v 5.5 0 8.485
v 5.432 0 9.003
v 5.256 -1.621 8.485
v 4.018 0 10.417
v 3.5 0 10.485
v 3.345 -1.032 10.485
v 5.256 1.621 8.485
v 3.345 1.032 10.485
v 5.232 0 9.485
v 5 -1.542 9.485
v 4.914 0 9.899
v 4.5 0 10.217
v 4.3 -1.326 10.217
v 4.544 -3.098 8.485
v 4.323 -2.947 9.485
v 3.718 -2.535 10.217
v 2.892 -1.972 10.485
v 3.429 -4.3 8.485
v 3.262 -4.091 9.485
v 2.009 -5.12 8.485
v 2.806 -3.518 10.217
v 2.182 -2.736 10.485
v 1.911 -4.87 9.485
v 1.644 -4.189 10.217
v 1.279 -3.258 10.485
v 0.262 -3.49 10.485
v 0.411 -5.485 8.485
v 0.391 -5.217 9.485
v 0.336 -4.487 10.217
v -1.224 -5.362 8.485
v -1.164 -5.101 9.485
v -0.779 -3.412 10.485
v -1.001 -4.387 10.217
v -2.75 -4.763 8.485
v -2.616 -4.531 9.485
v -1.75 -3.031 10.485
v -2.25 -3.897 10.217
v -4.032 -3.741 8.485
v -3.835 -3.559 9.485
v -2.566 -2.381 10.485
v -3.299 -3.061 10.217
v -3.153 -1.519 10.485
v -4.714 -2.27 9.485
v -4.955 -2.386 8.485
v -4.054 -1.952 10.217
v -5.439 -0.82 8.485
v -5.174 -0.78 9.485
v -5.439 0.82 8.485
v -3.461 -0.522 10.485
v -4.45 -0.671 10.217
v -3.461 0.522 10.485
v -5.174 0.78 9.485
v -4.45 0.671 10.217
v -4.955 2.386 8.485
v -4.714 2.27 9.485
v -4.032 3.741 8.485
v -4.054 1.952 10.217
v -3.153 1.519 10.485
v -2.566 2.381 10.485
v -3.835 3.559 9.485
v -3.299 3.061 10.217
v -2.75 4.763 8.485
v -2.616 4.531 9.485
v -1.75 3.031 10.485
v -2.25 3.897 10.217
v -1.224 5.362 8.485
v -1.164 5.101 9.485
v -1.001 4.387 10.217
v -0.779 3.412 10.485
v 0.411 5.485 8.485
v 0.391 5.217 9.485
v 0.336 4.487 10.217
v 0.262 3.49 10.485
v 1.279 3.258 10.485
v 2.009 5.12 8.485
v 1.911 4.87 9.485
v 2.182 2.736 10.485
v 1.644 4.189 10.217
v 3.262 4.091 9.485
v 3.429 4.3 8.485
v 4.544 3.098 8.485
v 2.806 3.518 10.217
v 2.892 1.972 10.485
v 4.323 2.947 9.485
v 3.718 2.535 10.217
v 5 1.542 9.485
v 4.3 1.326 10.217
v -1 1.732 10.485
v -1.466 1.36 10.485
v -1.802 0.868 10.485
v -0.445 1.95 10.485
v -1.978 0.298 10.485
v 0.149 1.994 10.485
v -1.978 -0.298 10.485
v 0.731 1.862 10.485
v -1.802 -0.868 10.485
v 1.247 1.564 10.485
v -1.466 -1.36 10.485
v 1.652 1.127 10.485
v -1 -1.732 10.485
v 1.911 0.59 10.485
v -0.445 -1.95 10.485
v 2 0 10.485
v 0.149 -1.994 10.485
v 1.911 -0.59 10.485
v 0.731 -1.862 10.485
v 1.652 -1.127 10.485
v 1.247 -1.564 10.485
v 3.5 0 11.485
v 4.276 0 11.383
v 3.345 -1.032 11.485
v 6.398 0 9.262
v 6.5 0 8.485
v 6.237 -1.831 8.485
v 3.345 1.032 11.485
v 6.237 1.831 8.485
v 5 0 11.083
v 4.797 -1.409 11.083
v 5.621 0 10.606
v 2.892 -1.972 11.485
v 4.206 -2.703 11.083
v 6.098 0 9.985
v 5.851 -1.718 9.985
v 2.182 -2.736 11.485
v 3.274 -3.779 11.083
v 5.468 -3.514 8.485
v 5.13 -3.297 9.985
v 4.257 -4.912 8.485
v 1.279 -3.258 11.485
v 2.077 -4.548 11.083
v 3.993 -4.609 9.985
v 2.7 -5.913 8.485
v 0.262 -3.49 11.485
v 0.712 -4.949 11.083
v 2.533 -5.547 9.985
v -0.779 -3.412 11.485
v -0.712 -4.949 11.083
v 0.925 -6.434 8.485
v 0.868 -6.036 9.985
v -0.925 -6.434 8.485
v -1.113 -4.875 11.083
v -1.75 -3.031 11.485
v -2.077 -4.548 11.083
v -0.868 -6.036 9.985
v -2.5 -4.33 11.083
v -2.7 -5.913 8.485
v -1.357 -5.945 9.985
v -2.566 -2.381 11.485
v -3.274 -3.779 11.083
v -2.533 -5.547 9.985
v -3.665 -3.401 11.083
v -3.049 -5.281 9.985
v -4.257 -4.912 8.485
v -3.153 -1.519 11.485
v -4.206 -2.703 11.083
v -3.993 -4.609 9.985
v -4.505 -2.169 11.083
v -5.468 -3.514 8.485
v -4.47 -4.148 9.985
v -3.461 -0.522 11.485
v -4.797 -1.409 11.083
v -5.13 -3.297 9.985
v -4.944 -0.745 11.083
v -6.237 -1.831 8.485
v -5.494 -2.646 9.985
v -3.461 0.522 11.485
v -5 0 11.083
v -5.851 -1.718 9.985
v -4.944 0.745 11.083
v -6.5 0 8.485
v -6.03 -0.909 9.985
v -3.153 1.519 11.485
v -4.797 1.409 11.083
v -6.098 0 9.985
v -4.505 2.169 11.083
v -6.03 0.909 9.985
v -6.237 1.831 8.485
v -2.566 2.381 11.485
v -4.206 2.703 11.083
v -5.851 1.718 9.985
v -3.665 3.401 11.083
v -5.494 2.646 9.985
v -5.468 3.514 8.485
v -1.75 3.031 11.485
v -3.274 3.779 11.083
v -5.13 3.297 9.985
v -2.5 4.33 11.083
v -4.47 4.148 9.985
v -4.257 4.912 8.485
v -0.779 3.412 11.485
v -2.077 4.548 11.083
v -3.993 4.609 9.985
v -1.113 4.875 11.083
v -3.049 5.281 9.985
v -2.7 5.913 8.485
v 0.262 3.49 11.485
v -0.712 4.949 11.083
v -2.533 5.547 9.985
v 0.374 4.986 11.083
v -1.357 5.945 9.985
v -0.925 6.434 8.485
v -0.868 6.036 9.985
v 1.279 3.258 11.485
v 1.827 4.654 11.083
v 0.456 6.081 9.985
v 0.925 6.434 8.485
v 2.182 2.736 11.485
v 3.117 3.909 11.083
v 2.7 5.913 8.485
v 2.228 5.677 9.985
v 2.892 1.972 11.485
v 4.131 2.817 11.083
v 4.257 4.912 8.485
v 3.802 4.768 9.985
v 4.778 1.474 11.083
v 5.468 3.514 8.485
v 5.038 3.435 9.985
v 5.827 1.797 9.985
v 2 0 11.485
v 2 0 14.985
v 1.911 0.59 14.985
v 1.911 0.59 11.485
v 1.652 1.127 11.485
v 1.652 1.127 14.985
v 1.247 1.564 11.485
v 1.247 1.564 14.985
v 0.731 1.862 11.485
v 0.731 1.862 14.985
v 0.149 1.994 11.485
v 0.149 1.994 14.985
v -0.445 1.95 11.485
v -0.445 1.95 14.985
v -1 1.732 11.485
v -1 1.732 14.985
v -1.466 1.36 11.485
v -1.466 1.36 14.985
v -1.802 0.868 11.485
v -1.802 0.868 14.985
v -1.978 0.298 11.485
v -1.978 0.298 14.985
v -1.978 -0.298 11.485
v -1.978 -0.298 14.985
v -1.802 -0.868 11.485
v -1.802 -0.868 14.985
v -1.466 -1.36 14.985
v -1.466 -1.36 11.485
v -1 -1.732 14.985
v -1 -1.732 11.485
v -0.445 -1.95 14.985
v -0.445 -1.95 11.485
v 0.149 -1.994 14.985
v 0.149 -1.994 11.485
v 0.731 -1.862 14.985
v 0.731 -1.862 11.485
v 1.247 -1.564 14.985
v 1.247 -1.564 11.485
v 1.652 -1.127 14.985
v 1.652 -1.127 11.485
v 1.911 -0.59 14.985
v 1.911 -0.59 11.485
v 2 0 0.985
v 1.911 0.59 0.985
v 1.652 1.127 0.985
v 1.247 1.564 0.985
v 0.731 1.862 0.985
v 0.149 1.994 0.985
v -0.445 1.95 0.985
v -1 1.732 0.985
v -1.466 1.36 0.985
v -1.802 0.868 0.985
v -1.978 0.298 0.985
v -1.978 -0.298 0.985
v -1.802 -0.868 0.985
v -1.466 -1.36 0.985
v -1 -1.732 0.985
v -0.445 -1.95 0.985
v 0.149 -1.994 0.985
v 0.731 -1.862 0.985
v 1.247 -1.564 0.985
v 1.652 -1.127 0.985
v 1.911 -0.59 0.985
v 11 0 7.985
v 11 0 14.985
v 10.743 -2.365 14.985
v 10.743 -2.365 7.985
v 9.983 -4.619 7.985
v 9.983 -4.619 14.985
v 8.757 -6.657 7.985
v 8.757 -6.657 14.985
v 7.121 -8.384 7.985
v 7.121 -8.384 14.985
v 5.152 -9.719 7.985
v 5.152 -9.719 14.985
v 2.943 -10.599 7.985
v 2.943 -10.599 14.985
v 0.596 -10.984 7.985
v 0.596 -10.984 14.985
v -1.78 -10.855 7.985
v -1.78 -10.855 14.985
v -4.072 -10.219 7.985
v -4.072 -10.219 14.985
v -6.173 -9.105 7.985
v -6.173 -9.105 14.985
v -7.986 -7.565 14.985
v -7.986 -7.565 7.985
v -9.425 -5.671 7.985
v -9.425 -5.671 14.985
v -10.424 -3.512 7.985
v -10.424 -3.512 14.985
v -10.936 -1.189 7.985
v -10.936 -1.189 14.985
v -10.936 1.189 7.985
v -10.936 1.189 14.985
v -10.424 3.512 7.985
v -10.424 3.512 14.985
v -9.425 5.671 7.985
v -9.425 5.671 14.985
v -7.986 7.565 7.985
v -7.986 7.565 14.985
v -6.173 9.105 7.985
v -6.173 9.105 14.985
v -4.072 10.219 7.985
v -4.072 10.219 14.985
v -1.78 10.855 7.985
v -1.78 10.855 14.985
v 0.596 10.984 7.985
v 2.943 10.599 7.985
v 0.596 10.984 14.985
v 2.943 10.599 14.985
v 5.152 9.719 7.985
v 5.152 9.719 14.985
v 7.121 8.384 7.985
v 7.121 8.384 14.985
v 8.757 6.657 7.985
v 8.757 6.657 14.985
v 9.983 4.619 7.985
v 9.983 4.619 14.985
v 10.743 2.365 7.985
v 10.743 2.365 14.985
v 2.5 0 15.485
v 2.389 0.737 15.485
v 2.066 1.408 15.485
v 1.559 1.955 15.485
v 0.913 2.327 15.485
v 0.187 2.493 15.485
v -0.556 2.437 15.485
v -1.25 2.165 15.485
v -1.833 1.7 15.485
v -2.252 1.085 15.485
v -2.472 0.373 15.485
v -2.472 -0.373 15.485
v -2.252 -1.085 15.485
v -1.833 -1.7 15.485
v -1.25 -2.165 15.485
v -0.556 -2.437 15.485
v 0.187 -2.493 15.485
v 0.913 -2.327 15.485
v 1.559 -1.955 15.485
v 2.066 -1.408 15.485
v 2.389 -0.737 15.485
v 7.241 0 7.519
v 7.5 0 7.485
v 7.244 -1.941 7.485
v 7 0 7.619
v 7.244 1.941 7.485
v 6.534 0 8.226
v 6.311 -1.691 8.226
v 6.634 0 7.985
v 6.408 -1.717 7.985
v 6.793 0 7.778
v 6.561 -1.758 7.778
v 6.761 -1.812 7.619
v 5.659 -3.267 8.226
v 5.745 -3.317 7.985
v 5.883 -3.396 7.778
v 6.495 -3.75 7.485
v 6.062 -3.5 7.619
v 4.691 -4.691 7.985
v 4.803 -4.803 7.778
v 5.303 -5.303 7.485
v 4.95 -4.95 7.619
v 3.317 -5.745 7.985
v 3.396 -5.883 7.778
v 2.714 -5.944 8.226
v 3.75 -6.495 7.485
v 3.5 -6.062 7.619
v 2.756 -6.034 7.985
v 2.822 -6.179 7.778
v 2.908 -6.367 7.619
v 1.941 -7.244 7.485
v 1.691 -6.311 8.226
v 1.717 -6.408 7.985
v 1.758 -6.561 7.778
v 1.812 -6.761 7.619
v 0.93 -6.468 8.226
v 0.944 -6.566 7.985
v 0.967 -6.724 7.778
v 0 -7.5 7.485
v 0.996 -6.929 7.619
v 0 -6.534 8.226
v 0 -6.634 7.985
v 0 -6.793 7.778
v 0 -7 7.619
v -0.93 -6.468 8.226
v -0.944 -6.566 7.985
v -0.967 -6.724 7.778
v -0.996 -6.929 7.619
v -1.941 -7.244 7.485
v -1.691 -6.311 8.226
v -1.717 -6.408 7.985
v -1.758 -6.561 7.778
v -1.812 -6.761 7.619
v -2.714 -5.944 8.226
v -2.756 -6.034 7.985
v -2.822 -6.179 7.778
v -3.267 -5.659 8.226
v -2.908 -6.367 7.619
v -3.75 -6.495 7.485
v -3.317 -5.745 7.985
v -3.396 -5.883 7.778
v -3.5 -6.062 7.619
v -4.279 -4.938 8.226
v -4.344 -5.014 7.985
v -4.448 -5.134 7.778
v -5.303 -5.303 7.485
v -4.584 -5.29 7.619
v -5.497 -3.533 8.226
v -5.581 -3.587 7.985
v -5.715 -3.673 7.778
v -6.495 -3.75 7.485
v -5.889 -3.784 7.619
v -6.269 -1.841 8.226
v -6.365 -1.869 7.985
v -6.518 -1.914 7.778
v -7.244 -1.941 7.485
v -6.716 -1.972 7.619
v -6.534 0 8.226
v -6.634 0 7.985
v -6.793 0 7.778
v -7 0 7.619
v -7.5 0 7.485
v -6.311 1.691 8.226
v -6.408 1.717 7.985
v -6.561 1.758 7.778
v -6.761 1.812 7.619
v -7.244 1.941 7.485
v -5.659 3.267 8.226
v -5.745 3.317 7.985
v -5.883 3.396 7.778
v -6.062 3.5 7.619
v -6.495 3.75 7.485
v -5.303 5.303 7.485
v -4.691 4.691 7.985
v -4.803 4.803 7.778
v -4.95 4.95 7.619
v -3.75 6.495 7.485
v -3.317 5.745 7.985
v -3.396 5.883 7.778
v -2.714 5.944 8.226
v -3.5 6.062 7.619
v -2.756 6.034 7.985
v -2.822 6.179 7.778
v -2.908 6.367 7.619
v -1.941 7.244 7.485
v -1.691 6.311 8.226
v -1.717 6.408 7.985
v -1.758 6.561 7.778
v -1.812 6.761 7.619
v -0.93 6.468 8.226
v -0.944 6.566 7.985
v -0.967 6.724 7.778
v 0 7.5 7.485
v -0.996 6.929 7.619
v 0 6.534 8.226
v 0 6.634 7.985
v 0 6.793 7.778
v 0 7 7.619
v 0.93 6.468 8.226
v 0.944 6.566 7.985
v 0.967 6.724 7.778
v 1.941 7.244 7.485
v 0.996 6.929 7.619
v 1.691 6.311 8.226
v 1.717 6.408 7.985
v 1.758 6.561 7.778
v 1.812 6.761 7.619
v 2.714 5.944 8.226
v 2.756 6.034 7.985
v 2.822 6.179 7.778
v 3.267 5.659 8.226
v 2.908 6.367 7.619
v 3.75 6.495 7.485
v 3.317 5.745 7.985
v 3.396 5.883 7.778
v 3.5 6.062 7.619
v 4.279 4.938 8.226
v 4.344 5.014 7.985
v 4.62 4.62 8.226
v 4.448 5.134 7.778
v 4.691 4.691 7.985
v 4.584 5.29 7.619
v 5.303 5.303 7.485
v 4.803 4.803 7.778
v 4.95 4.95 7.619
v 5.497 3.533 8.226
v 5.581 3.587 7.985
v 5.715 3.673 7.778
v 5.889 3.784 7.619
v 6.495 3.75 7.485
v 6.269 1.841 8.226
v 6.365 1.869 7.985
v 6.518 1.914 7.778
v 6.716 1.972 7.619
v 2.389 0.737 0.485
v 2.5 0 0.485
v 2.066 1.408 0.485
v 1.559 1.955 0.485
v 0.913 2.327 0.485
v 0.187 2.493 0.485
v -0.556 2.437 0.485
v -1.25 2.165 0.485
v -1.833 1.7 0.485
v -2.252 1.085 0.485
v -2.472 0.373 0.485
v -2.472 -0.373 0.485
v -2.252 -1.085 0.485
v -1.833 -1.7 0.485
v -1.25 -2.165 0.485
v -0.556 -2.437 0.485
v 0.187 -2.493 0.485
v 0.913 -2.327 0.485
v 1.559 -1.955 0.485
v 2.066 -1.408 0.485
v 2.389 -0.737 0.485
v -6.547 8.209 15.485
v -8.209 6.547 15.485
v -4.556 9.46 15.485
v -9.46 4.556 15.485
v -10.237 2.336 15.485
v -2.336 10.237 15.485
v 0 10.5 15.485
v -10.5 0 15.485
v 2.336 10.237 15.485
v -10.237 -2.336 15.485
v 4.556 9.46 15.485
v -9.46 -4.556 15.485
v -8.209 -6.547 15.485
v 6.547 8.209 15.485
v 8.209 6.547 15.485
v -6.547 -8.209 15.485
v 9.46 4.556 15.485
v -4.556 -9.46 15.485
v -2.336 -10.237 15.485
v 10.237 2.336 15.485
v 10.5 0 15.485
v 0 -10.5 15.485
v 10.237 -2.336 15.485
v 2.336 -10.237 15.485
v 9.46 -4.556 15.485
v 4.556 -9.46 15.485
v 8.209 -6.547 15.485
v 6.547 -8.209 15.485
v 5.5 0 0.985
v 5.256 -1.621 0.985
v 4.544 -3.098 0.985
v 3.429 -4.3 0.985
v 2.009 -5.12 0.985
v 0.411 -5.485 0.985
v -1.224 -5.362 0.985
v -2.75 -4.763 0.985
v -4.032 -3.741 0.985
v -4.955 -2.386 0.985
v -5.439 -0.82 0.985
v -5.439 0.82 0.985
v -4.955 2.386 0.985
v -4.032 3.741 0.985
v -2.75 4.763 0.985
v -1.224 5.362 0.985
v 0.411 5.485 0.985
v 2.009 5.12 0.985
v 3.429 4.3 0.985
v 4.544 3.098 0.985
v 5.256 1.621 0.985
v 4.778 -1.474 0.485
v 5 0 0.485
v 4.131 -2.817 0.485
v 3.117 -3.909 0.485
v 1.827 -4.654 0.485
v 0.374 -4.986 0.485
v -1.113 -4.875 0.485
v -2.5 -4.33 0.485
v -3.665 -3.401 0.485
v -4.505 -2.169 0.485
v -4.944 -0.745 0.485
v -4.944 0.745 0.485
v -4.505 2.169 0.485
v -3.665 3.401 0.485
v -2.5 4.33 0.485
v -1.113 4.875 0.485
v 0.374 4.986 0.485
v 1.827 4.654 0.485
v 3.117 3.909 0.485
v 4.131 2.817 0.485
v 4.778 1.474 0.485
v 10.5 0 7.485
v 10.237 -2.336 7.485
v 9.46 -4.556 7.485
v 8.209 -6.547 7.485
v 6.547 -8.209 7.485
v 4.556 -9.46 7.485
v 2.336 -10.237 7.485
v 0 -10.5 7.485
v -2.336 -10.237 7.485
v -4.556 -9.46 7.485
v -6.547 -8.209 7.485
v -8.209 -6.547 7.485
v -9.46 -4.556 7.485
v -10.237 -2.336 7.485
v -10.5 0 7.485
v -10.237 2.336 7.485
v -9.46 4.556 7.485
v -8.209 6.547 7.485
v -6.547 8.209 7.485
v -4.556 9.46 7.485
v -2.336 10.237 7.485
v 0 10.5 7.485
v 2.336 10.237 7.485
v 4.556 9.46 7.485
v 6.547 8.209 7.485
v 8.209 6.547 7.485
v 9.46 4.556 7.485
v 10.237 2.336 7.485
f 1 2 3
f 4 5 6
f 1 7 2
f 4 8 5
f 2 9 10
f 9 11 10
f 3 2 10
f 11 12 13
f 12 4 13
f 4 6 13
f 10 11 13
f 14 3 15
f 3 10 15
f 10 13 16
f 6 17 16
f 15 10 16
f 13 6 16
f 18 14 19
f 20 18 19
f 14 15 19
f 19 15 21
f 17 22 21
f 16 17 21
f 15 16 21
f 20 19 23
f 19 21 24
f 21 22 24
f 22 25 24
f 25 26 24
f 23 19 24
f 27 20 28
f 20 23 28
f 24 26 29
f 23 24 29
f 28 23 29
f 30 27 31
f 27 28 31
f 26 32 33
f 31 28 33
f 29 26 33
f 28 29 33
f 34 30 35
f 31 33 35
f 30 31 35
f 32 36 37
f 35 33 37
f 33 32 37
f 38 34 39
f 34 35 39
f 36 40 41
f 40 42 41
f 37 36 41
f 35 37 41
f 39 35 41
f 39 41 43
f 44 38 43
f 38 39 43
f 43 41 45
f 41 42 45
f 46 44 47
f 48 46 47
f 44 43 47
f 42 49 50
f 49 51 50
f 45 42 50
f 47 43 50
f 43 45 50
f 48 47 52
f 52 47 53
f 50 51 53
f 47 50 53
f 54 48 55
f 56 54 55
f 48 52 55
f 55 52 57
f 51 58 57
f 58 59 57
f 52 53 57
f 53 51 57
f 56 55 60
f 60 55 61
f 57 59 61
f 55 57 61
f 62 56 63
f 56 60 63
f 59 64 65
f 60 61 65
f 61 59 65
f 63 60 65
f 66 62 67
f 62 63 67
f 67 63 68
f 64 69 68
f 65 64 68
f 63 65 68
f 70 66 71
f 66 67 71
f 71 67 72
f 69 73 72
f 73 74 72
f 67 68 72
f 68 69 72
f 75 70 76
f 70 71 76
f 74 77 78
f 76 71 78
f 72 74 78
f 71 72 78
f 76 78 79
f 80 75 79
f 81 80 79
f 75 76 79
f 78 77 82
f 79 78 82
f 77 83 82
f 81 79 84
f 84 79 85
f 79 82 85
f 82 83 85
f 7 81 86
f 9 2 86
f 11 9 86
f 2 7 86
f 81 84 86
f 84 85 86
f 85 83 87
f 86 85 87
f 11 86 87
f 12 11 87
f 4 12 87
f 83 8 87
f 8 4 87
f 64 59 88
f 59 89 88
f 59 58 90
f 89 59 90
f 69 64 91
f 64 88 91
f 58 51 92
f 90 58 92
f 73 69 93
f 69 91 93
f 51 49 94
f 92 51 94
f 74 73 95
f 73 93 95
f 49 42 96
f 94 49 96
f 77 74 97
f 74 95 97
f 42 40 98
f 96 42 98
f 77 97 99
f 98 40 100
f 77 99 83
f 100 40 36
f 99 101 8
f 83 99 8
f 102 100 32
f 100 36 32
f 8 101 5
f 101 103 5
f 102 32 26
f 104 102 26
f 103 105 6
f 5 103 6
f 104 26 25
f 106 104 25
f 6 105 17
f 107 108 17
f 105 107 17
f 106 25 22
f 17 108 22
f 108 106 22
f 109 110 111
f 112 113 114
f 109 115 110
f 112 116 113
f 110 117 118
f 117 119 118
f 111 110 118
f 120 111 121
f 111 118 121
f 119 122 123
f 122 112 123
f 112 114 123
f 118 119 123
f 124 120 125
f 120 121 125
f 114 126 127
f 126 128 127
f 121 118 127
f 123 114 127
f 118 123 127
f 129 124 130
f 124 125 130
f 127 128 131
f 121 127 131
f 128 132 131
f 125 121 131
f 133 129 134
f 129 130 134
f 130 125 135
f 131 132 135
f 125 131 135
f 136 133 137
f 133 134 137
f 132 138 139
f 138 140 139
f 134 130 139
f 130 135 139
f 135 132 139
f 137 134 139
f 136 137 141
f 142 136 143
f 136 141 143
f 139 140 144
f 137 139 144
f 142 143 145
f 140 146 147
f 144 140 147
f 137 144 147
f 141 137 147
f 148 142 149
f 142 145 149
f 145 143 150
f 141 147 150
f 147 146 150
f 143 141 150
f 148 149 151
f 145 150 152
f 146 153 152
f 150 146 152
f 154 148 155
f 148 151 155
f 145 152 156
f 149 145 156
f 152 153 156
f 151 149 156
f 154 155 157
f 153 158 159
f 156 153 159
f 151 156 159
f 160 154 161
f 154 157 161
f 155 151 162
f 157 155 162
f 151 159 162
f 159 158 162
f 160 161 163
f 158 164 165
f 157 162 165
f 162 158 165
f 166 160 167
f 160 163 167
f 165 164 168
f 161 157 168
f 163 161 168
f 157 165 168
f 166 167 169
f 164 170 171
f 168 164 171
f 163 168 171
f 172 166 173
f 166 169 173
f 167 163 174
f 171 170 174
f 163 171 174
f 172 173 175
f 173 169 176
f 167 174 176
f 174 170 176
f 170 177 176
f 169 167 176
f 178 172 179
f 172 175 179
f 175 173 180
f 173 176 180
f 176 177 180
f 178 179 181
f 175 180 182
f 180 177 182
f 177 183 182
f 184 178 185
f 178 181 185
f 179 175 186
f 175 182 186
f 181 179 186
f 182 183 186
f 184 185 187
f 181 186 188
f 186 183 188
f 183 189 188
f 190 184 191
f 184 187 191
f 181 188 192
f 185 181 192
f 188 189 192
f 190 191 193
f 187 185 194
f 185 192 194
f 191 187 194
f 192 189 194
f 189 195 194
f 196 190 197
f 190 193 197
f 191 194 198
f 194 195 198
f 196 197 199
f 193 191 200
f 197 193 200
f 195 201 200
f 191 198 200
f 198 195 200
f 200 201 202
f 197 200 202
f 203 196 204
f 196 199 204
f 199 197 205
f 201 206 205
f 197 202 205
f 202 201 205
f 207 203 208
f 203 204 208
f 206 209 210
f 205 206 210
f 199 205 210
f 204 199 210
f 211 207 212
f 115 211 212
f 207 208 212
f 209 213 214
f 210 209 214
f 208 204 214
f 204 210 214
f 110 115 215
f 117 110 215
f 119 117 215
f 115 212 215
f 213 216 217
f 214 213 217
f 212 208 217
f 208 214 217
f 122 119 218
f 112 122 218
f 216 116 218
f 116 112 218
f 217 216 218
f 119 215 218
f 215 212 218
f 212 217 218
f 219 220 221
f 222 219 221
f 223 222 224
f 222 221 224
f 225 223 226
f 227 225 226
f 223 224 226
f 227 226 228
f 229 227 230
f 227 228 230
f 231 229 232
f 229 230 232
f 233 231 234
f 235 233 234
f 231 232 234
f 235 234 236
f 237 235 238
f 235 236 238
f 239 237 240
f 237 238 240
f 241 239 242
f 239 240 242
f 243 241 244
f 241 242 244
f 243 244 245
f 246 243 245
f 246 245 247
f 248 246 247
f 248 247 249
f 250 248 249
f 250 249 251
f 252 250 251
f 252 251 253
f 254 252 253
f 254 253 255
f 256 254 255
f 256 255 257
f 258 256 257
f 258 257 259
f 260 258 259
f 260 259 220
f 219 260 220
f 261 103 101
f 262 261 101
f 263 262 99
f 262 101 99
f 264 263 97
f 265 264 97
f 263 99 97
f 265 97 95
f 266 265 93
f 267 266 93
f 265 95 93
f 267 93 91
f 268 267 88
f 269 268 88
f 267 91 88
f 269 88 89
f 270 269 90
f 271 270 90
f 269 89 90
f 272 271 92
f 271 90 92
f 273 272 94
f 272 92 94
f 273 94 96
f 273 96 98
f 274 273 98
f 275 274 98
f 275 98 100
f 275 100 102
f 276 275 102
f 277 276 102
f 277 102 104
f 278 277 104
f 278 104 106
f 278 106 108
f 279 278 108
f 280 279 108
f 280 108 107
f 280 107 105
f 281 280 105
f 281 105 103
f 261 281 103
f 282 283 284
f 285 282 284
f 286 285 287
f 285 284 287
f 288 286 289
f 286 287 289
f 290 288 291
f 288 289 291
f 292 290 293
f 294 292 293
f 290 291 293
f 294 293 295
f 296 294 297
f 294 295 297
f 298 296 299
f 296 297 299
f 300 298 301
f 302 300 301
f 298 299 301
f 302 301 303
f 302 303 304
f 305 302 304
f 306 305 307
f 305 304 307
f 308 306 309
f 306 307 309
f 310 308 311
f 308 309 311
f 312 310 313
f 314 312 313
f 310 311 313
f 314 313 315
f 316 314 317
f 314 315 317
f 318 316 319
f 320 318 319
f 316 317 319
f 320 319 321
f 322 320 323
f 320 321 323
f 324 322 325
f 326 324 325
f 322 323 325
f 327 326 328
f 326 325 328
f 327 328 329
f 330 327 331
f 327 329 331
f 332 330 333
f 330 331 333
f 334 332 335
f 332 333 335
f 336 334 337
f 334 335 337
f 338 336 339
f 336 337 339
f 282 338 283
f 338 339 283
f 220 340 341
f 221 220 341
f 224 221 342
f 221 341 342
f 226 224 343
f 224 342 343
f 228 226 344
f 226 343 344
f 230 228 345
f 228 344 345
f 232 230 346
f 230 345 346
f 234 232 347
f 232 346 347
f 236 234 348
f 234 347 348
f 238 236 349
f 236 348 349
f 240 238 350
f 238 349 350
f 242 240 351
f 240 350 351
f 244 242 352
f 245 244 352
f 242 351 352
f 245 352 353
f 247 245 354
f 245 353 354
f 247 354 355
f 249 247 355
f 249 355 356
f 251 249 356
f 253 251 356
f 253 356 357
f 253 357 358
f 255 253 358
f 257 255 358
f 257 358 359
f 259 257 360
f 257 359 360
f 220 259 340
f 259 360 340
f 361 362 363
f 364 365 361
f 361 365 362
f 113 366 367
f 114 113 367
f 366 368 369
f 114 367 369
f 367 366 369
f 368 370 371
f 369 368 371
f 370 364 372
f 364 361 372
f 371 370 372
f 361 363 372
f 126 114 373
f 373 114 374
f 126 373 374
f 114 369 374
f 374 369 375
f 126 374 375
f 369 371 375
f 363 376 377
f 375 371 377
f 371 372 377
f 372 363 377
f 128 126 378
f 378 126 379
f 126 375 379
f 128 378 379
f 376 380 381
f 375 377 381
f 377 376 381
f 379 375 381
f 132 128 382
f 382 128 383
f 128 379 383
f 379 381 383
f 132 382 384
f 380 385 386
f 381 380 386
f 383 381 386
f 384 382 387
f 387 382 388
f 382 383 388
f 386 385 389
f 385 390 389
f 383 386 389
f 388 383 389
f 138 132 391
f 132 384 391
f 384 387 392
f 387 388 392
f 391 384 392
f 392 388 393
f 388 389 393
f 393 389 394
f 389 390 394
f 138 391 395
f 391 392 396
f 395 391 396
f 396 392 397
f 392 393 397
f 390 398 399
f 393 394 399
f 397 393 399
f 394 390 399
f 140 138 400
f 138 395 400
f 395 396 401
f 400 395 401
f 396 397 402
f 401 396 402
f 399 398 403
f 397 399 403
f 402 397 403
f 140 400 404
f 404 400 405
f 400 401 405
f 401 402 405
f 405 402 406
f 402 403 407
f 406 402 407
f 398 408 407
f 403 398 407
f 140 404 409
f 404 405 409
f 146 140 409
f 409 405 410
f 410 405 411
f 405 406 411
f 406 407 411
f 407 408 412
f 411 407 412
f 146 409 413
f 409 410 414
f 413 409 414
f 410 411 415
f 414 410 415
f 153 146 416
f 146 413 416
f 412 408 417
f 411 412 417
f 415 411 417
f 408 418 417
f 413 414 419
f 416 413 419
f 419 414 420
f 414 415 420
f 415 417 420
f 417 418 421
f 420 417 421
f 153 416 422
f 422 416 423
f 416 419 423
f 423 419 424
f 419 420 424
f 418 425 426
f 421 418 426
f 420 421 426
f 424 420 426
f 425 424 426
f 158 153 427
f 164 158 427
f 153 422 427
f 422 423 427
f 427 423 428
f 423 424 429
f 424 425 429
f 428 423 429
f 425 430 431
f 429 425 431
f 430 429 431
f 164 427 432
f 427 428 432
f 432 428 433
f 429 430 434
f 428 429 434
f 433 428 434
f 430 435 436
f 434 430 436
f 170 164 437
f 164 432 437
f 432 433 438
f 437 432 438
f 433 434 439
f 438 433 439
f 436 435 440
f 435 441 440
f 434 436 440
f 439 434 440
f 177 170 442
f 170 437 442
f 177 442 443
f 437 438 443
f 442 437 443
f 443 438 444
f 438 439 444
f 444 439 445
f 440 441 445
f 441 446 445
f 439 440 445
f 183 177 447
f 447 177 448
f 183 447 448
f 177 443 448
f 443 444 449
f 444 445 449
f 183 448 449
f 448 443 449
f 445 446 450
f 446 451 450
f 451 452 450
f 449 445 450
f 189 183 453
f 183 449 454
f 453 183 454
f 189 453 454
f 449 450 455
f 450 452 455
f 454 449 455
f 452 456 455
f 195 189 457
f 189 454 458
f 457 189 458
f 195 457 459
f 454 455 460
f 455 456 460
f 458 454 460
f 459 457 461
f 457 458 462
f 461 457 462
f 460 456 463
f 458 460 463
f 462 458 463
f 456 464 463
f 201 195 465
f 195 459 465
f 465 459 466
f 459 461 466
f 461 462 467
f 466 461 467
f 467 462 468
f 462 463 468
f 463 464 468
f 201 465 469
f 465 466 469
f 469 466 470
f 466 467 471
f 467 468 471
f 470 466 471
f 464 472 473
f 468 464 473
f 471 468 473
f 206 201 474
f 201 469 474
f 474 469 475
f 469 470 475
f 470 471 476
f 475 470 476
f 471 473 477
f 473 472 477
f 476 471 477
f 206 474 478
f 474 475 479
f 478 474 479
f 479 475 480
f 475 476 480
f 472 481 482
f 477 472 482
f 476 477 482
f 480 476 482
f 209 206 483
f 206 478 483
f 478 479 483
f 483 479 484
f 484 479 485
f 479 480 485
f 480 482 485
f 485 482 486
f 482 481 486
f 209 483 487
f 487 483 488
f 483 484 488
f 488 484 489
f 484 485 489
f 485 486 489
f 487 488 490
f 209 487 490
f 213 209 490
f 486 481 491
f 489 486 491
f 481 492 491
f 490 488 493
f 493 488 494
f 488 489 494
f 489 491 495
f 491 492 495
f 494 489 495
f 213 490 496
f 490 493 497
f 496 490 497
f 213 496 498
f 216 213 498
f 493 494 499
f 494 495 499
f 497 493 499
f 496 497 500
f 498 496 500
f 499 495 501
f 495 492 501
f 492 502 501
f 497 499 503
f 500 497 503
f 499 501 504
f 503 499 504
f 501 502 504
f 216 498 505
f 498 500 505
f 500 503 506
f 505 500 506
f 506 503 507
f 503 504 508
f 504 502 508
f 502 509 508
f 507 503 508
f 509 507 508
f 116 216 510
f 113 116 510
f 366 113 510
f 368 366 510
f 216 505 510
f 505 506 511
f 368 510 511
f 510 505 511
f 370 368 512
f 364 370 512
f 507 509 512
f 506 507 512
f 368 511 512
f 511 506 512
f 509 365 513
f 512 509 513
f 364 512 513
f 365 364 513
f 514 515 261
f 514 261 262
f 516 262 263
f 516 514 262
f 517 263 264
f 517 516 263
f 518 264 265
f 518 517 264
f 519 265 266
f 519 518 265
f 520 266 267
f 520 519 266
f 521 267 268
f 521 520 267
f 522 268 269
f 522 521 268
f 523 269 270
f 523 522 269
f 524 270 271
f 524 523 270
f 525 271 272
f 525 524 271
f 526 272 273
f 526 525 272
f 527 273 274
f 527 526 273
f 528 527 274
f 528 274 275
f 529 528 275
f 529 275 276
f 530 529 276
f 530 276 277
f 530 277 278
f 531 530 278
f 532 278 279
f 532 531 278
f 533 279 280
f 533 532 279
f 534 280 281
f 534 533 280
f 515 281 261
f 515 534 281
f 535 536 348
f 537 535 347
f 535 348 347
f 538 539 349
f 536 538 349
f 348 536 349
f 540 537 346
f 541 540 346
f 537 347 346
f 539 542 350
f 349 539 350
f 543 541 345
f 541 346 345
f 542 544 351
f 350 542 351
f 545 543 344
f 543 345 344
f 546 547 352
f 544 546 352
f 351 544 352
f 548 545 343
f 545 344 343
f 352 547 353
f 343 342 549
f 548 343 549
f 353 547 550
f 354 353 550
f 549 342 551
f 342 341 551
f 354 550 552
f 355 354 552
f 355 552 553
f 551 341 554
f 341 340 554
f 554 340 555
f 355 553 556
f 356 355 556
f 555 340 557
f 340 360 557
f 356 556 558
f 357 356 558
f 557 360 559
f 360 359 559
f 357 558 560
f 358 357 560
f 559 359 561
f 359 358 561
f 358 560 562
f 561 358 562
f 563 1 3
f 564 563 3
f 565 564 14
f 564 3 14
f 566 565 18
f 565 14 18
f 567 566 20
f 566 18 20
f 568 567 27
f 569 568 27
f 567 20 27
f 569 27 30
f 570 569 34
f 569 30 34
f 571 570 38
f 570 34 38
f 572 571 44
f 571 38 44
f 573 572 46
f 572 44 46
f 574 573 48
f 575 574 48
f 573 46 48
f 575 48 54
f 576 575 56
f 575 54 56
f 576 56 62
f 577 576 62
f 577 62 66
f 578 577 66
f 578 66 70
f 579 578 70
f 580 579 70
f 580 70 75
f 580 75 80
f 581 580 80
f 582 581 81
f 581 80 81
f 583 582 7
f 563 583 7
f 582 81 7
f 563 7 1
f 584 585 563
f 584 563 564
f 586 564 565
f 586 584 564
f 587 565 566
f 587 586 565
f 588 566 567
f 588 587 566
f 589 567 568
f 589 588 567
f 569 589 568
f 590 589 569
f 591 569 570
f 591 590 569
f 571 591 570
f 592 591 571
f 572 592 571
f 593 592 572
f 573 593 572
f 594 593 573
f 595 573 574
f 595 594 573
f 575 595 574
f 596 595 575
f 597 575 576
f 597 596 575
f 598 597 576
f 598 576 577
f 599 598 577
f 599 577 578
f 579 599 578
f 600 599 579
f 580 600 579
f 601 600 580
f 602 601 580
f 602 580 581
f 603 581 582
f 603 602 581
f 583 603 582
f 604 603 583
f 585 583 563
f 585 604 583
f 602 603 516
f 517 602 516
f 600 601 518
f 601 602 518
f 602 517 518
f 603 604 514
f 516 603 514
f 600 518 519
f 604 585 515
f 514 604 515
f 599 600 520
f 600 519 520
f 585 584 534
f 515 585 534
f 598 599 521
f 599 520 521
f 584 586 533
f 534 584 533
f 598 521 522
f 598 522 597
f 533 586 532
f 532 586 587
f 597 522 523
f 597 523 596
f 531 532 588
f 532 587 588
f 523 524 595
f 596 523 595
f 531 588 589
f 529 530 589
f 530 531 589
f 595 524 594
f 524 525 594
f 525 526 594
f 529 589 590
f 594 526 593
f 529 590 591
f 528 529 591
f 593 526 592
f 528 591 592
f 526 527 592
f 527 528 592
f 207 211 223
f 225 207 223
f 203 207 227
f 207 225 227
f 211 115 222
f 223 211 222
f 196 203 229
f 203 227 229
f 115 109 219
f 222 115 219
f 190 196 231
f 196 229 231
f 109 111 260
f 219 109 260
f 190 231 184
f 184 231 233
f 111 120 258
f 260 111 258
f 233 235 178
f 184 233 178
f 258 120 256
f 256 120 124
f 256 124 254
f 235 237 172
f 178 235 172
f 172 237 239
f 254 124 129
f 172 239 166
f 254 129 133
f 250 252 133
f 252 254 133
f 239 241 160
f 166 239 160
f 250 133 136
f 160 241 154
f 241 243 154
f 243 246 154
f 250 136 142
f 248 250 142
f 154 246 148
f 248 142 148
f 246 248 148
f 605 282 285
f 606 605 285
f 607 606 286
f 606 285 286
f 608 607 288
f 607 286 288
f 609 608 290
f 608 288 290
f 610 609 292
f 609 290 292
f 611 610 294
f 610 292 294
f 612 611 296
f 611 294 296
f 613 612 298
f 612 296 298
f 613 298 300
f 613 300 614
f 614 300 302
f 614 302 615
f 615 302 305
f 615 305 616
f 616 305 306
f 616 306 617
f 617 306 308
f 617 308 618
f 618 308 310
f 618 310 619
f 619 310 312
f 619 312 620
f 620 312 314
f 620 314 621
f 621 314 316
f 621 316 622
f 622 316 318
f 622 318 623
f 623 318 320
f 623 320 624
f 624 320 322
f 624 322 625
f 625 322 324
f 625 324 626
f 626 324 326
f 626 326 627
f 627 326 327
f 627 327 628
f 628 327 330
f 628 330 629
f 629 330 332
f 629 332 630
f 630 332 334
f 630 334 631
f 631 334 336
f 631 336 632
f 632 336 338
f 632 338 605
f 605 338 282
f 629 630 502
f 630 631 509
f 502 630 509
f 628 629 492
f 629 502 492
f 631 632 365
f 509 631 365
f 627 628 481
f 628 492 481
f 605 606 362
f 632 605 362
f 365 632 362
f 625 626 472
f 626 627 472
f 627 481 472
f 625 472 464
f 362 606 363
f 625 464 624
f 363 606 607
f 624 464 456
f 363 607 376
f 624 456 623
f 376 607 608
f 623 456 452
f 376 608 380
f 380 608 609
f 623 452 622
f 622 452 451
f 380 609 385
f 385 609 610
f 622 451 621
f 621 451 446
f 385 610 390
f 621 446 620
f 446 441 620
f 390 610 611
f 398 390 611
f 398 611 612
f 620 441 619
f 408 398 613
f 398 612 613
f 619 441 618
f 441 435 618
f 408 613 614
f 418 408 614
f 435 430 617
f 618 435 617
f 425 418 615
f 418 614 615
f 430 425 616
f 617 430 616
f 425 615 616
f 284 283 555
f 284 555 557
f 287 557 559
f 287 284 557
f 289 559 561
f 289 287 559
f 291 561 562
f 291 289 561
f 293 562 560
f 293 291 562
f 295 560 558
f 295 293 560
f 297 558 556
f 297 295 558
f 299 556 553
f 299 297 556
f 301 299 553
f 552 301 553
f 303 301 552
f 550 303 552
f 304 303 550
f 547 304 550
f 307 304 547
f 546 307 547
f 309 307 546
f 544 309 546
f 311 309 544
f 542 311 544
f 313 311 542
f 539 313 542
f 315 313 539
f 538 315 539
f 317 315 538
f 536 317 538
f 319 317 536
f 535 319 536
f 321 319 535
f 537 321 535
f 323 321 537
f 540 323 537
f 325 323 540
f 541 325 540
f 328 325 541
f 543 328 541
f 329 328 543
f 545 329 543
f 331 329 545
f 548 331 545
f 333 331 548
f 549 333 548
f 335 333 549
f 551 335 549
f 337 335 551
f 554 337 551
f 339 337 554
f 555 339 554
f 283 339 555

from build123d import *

# Parameters (mm, degrees)
F2_R     = 2
F3_DEPTH = 10.001
F4_SIZE  = 0.5
F5_R     = 2
F6_DEPTH = 25
F7_SIZE  = 0.5
F8_R     = 0.99999


# Not quite as in the source:
# - a fillet or chamfer is up to 0.001 mm smaller than in the source, because OpenCascade refuses the exact size


with BuildPart() as f1:
    # F0 (on Front) → F1 (revolve)
    with BuildSketch(Plane.XZ):
        with BuildLine():
            Line((3.5, 10.4850548723), (0, 10.4850548723))
            Line((0, 10.4850548723), (0, 0.4850548723))
            Line((0, 0.4850548723), (5.5, 0.4850548723))
            Line((5.5, 0.4850548723), (5.5, 8.4850548723))
            ThreePointArc((5.5, 8.4850548723), (4.9142135624, 9.8992684347), (3.5, 10.4850548723))
        make_face()
    revolve(axis=Axis((0, 0, 5.4850548723), (0, 0, -1)))

    # F2 (on face) → F3 (cut, through all)
    with BuildSketch(Plane.XY.offset(10.4850548723)):
        Circle(F2_R)
    extrude(amount=-F3_DEPTH, mode=Mode.SUBTRACT)

    # F4
    f4_edges = [f1.edges().sort_by_distance(p)[0] for p in [
        (-5.5, 0, 0.485055),
        (-2, 0, 0.485055),
    ]]
    chamfer(f4_edges, length=F4_SIZE)


with BuildPart() as f1b:
    # F0 (on Front) → F1, piece 2 (revolve)
    with BuildSketch(Plane.XZ):
        with BuildLine():
            Line((0, 11.4850548723), (3.5, 11.4850548723))
            ThreePointArc((3.5, 11.4850548723), (5.6213203436, 10.6063752159), (6.5, 8.4850548723))
            Line((6.5, 8.4850548723), (6.5, 7.4850548723))
            Line((6.5, 7.4850548723), (11, 7.4850548723))
            Line((11, 7.4850548723), (11, 15.4850548723))
            Line((11, 15.4850548723), (0, 15.4850548723))
            Line((0, 15.4850548723), (0, 11.4850548723))
        make_face()
    revolve(axis=Axis((0, 0, 5.4850548723), (0, 0, -1)))

    # F5 (on face) → F6 (cut)
    with BuildSketch(Plane.XY.offset(15.4850548723)):
        Circle(F5_R)
    extrude(amount=-F6_DEPTH, mode=Mode.SUBTRACT)

    # F7
    f7_edges = [f1b.edges().sort_by_distance(p)[0] for p in [
        (-11, 0, 7.485055),
        (-11, 0, 15.485055),
        (-2, 0, 15.485055),
    ]]
    chamfer(f7_edges, length=F7_SIZE)

    # F8 (radius 1 in the source; OpenCascade refuses exactly that, so slightly less here)
    f8_edges = [f1b.edges().sort_by_distance(p)[0] for p in [
        (-6.5, 0, 7.485055),
    ]]
    fillet(f8_edges, radius=F8_R)


solid = Compound([f1.part, f1b.part])
